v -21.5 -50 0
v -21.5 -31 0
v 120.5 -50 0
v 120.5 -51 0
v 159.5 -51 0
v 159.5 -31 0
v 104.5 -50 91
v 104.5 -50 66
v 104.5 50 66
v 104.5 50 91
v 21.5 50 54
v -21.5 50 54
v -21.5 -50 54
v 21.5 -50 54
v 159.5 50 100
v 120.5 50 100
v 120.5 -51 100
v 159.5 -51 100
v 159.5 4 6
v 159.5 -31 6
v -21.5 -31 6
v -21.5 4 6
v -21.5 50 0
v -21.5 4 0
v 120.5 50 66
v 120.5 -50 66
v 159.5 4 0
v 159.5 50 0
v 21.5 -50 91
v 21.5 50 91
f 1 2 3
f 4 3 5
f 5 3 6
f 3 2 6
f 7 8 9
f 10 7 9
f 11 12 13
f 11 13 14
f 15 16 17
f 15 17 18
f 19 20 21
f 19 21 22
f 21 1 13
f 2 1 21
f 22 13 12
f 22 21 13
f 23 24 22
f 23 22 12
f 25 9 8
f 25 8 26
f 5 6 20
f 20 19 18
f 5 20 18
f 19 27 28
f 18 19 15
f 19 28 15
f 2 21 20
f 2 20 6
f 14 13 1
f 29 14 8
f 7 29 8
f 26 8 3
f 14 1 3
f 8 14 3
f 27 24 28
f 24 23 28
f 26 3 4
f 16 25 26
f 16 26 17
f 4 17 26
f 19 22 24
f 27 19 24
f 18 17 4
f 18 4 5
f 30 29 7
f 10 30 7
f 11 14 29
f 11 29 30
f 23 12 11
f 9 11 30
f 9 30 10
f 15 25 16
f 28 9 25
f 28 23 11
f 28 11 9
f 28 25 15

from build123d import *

# Parameters (mm, degrees)
SKETCH2_W           = 43
SKETCH2_H           = 100
BOSS_EXTRUDE1_DEPTH = 54
SKETCH3_W           = 83
SKETCH3_H           = 100
BOSS_EXTRUDE2_DEPTH = 91
SKETCH4_W           = 16
SKETCH4_H           = 100
BOSS_EXTRUDE3_DEPTH = 66
SKETCH6_W           = 39
SKETCH6_H           = 100
BOSS_EXTRUDE4_DEPTH = 100
SKETCH5_W           = 6
SKETCH5_H           = 35
CUT_EXTRUDE1_DEPTH  = 200
SKETCH7_W           = 39
SKETCH7_H           = 100
BOSS_EXTRUDE5_DEPTH = 1


with BuildPart() as part:
    # Sketch2 → Boss-Extrude1 (new body)
    with BuildSketch(Plane.XY):
        Rectangle(SKETCH2_W, SKETCH2_H)
    extrude(amount=BOSS_EXTRUDE1_DEPTH)

    # Sketch3 → Boss-Extrude2 (add)
    with BuildSketch(Plane.XY):
        with Locations((63, 0)):
            Rectangle(SKETCH3_W, SKETCH3_H)
    extrude(amount=BOSS_EXTRUDE2_DEPTH)

    # Sketch4 → Boss-Extrude3 (add)
    with BuildSketch(Plane.XY):
        with Locations((112.5, 0)):
            Rectangle(SKETCH4_W, SKETCH4_H)
    extrude(amount=BOSS_EXTRUDE3_DEPTH)

    # Sketch6 → Boss-Extrude4 (add)
    with BuildSketch(Plane.XY):
        with Locations((140, 0)):
            Rectangle(SKETCH6_W, SKETCH6_H)
    extrude(amount=BOSS_EXTRUDE4_DEPTH)

    # Sketch5 → Cut-Extrude1 (cut)
    with BuildSketch(Plane(origin=(159.5, 0, 0), x_dir=(0, 0, -1), z_dir=(1, 0, 0))):
        with Locations((-3, -13.5)):
            Rectangle(SKETCH5_W, SKETCH5_H)
    extrude(amount=-CUT_EXTRUDE1_DEPTH, mode=Mode.SUBTRACT)

    # Sketch7 → Boss-Extrude5 (add)
    with BuildSketch(Plane.XZ.offset(50)):
        with Locations((140, 50)):
            Rectangle(SKETCH7_W, SKETCH7_H)
    extrude(amount=BOSS_EXTRUDE5_DEPTH)


solid = part.part
